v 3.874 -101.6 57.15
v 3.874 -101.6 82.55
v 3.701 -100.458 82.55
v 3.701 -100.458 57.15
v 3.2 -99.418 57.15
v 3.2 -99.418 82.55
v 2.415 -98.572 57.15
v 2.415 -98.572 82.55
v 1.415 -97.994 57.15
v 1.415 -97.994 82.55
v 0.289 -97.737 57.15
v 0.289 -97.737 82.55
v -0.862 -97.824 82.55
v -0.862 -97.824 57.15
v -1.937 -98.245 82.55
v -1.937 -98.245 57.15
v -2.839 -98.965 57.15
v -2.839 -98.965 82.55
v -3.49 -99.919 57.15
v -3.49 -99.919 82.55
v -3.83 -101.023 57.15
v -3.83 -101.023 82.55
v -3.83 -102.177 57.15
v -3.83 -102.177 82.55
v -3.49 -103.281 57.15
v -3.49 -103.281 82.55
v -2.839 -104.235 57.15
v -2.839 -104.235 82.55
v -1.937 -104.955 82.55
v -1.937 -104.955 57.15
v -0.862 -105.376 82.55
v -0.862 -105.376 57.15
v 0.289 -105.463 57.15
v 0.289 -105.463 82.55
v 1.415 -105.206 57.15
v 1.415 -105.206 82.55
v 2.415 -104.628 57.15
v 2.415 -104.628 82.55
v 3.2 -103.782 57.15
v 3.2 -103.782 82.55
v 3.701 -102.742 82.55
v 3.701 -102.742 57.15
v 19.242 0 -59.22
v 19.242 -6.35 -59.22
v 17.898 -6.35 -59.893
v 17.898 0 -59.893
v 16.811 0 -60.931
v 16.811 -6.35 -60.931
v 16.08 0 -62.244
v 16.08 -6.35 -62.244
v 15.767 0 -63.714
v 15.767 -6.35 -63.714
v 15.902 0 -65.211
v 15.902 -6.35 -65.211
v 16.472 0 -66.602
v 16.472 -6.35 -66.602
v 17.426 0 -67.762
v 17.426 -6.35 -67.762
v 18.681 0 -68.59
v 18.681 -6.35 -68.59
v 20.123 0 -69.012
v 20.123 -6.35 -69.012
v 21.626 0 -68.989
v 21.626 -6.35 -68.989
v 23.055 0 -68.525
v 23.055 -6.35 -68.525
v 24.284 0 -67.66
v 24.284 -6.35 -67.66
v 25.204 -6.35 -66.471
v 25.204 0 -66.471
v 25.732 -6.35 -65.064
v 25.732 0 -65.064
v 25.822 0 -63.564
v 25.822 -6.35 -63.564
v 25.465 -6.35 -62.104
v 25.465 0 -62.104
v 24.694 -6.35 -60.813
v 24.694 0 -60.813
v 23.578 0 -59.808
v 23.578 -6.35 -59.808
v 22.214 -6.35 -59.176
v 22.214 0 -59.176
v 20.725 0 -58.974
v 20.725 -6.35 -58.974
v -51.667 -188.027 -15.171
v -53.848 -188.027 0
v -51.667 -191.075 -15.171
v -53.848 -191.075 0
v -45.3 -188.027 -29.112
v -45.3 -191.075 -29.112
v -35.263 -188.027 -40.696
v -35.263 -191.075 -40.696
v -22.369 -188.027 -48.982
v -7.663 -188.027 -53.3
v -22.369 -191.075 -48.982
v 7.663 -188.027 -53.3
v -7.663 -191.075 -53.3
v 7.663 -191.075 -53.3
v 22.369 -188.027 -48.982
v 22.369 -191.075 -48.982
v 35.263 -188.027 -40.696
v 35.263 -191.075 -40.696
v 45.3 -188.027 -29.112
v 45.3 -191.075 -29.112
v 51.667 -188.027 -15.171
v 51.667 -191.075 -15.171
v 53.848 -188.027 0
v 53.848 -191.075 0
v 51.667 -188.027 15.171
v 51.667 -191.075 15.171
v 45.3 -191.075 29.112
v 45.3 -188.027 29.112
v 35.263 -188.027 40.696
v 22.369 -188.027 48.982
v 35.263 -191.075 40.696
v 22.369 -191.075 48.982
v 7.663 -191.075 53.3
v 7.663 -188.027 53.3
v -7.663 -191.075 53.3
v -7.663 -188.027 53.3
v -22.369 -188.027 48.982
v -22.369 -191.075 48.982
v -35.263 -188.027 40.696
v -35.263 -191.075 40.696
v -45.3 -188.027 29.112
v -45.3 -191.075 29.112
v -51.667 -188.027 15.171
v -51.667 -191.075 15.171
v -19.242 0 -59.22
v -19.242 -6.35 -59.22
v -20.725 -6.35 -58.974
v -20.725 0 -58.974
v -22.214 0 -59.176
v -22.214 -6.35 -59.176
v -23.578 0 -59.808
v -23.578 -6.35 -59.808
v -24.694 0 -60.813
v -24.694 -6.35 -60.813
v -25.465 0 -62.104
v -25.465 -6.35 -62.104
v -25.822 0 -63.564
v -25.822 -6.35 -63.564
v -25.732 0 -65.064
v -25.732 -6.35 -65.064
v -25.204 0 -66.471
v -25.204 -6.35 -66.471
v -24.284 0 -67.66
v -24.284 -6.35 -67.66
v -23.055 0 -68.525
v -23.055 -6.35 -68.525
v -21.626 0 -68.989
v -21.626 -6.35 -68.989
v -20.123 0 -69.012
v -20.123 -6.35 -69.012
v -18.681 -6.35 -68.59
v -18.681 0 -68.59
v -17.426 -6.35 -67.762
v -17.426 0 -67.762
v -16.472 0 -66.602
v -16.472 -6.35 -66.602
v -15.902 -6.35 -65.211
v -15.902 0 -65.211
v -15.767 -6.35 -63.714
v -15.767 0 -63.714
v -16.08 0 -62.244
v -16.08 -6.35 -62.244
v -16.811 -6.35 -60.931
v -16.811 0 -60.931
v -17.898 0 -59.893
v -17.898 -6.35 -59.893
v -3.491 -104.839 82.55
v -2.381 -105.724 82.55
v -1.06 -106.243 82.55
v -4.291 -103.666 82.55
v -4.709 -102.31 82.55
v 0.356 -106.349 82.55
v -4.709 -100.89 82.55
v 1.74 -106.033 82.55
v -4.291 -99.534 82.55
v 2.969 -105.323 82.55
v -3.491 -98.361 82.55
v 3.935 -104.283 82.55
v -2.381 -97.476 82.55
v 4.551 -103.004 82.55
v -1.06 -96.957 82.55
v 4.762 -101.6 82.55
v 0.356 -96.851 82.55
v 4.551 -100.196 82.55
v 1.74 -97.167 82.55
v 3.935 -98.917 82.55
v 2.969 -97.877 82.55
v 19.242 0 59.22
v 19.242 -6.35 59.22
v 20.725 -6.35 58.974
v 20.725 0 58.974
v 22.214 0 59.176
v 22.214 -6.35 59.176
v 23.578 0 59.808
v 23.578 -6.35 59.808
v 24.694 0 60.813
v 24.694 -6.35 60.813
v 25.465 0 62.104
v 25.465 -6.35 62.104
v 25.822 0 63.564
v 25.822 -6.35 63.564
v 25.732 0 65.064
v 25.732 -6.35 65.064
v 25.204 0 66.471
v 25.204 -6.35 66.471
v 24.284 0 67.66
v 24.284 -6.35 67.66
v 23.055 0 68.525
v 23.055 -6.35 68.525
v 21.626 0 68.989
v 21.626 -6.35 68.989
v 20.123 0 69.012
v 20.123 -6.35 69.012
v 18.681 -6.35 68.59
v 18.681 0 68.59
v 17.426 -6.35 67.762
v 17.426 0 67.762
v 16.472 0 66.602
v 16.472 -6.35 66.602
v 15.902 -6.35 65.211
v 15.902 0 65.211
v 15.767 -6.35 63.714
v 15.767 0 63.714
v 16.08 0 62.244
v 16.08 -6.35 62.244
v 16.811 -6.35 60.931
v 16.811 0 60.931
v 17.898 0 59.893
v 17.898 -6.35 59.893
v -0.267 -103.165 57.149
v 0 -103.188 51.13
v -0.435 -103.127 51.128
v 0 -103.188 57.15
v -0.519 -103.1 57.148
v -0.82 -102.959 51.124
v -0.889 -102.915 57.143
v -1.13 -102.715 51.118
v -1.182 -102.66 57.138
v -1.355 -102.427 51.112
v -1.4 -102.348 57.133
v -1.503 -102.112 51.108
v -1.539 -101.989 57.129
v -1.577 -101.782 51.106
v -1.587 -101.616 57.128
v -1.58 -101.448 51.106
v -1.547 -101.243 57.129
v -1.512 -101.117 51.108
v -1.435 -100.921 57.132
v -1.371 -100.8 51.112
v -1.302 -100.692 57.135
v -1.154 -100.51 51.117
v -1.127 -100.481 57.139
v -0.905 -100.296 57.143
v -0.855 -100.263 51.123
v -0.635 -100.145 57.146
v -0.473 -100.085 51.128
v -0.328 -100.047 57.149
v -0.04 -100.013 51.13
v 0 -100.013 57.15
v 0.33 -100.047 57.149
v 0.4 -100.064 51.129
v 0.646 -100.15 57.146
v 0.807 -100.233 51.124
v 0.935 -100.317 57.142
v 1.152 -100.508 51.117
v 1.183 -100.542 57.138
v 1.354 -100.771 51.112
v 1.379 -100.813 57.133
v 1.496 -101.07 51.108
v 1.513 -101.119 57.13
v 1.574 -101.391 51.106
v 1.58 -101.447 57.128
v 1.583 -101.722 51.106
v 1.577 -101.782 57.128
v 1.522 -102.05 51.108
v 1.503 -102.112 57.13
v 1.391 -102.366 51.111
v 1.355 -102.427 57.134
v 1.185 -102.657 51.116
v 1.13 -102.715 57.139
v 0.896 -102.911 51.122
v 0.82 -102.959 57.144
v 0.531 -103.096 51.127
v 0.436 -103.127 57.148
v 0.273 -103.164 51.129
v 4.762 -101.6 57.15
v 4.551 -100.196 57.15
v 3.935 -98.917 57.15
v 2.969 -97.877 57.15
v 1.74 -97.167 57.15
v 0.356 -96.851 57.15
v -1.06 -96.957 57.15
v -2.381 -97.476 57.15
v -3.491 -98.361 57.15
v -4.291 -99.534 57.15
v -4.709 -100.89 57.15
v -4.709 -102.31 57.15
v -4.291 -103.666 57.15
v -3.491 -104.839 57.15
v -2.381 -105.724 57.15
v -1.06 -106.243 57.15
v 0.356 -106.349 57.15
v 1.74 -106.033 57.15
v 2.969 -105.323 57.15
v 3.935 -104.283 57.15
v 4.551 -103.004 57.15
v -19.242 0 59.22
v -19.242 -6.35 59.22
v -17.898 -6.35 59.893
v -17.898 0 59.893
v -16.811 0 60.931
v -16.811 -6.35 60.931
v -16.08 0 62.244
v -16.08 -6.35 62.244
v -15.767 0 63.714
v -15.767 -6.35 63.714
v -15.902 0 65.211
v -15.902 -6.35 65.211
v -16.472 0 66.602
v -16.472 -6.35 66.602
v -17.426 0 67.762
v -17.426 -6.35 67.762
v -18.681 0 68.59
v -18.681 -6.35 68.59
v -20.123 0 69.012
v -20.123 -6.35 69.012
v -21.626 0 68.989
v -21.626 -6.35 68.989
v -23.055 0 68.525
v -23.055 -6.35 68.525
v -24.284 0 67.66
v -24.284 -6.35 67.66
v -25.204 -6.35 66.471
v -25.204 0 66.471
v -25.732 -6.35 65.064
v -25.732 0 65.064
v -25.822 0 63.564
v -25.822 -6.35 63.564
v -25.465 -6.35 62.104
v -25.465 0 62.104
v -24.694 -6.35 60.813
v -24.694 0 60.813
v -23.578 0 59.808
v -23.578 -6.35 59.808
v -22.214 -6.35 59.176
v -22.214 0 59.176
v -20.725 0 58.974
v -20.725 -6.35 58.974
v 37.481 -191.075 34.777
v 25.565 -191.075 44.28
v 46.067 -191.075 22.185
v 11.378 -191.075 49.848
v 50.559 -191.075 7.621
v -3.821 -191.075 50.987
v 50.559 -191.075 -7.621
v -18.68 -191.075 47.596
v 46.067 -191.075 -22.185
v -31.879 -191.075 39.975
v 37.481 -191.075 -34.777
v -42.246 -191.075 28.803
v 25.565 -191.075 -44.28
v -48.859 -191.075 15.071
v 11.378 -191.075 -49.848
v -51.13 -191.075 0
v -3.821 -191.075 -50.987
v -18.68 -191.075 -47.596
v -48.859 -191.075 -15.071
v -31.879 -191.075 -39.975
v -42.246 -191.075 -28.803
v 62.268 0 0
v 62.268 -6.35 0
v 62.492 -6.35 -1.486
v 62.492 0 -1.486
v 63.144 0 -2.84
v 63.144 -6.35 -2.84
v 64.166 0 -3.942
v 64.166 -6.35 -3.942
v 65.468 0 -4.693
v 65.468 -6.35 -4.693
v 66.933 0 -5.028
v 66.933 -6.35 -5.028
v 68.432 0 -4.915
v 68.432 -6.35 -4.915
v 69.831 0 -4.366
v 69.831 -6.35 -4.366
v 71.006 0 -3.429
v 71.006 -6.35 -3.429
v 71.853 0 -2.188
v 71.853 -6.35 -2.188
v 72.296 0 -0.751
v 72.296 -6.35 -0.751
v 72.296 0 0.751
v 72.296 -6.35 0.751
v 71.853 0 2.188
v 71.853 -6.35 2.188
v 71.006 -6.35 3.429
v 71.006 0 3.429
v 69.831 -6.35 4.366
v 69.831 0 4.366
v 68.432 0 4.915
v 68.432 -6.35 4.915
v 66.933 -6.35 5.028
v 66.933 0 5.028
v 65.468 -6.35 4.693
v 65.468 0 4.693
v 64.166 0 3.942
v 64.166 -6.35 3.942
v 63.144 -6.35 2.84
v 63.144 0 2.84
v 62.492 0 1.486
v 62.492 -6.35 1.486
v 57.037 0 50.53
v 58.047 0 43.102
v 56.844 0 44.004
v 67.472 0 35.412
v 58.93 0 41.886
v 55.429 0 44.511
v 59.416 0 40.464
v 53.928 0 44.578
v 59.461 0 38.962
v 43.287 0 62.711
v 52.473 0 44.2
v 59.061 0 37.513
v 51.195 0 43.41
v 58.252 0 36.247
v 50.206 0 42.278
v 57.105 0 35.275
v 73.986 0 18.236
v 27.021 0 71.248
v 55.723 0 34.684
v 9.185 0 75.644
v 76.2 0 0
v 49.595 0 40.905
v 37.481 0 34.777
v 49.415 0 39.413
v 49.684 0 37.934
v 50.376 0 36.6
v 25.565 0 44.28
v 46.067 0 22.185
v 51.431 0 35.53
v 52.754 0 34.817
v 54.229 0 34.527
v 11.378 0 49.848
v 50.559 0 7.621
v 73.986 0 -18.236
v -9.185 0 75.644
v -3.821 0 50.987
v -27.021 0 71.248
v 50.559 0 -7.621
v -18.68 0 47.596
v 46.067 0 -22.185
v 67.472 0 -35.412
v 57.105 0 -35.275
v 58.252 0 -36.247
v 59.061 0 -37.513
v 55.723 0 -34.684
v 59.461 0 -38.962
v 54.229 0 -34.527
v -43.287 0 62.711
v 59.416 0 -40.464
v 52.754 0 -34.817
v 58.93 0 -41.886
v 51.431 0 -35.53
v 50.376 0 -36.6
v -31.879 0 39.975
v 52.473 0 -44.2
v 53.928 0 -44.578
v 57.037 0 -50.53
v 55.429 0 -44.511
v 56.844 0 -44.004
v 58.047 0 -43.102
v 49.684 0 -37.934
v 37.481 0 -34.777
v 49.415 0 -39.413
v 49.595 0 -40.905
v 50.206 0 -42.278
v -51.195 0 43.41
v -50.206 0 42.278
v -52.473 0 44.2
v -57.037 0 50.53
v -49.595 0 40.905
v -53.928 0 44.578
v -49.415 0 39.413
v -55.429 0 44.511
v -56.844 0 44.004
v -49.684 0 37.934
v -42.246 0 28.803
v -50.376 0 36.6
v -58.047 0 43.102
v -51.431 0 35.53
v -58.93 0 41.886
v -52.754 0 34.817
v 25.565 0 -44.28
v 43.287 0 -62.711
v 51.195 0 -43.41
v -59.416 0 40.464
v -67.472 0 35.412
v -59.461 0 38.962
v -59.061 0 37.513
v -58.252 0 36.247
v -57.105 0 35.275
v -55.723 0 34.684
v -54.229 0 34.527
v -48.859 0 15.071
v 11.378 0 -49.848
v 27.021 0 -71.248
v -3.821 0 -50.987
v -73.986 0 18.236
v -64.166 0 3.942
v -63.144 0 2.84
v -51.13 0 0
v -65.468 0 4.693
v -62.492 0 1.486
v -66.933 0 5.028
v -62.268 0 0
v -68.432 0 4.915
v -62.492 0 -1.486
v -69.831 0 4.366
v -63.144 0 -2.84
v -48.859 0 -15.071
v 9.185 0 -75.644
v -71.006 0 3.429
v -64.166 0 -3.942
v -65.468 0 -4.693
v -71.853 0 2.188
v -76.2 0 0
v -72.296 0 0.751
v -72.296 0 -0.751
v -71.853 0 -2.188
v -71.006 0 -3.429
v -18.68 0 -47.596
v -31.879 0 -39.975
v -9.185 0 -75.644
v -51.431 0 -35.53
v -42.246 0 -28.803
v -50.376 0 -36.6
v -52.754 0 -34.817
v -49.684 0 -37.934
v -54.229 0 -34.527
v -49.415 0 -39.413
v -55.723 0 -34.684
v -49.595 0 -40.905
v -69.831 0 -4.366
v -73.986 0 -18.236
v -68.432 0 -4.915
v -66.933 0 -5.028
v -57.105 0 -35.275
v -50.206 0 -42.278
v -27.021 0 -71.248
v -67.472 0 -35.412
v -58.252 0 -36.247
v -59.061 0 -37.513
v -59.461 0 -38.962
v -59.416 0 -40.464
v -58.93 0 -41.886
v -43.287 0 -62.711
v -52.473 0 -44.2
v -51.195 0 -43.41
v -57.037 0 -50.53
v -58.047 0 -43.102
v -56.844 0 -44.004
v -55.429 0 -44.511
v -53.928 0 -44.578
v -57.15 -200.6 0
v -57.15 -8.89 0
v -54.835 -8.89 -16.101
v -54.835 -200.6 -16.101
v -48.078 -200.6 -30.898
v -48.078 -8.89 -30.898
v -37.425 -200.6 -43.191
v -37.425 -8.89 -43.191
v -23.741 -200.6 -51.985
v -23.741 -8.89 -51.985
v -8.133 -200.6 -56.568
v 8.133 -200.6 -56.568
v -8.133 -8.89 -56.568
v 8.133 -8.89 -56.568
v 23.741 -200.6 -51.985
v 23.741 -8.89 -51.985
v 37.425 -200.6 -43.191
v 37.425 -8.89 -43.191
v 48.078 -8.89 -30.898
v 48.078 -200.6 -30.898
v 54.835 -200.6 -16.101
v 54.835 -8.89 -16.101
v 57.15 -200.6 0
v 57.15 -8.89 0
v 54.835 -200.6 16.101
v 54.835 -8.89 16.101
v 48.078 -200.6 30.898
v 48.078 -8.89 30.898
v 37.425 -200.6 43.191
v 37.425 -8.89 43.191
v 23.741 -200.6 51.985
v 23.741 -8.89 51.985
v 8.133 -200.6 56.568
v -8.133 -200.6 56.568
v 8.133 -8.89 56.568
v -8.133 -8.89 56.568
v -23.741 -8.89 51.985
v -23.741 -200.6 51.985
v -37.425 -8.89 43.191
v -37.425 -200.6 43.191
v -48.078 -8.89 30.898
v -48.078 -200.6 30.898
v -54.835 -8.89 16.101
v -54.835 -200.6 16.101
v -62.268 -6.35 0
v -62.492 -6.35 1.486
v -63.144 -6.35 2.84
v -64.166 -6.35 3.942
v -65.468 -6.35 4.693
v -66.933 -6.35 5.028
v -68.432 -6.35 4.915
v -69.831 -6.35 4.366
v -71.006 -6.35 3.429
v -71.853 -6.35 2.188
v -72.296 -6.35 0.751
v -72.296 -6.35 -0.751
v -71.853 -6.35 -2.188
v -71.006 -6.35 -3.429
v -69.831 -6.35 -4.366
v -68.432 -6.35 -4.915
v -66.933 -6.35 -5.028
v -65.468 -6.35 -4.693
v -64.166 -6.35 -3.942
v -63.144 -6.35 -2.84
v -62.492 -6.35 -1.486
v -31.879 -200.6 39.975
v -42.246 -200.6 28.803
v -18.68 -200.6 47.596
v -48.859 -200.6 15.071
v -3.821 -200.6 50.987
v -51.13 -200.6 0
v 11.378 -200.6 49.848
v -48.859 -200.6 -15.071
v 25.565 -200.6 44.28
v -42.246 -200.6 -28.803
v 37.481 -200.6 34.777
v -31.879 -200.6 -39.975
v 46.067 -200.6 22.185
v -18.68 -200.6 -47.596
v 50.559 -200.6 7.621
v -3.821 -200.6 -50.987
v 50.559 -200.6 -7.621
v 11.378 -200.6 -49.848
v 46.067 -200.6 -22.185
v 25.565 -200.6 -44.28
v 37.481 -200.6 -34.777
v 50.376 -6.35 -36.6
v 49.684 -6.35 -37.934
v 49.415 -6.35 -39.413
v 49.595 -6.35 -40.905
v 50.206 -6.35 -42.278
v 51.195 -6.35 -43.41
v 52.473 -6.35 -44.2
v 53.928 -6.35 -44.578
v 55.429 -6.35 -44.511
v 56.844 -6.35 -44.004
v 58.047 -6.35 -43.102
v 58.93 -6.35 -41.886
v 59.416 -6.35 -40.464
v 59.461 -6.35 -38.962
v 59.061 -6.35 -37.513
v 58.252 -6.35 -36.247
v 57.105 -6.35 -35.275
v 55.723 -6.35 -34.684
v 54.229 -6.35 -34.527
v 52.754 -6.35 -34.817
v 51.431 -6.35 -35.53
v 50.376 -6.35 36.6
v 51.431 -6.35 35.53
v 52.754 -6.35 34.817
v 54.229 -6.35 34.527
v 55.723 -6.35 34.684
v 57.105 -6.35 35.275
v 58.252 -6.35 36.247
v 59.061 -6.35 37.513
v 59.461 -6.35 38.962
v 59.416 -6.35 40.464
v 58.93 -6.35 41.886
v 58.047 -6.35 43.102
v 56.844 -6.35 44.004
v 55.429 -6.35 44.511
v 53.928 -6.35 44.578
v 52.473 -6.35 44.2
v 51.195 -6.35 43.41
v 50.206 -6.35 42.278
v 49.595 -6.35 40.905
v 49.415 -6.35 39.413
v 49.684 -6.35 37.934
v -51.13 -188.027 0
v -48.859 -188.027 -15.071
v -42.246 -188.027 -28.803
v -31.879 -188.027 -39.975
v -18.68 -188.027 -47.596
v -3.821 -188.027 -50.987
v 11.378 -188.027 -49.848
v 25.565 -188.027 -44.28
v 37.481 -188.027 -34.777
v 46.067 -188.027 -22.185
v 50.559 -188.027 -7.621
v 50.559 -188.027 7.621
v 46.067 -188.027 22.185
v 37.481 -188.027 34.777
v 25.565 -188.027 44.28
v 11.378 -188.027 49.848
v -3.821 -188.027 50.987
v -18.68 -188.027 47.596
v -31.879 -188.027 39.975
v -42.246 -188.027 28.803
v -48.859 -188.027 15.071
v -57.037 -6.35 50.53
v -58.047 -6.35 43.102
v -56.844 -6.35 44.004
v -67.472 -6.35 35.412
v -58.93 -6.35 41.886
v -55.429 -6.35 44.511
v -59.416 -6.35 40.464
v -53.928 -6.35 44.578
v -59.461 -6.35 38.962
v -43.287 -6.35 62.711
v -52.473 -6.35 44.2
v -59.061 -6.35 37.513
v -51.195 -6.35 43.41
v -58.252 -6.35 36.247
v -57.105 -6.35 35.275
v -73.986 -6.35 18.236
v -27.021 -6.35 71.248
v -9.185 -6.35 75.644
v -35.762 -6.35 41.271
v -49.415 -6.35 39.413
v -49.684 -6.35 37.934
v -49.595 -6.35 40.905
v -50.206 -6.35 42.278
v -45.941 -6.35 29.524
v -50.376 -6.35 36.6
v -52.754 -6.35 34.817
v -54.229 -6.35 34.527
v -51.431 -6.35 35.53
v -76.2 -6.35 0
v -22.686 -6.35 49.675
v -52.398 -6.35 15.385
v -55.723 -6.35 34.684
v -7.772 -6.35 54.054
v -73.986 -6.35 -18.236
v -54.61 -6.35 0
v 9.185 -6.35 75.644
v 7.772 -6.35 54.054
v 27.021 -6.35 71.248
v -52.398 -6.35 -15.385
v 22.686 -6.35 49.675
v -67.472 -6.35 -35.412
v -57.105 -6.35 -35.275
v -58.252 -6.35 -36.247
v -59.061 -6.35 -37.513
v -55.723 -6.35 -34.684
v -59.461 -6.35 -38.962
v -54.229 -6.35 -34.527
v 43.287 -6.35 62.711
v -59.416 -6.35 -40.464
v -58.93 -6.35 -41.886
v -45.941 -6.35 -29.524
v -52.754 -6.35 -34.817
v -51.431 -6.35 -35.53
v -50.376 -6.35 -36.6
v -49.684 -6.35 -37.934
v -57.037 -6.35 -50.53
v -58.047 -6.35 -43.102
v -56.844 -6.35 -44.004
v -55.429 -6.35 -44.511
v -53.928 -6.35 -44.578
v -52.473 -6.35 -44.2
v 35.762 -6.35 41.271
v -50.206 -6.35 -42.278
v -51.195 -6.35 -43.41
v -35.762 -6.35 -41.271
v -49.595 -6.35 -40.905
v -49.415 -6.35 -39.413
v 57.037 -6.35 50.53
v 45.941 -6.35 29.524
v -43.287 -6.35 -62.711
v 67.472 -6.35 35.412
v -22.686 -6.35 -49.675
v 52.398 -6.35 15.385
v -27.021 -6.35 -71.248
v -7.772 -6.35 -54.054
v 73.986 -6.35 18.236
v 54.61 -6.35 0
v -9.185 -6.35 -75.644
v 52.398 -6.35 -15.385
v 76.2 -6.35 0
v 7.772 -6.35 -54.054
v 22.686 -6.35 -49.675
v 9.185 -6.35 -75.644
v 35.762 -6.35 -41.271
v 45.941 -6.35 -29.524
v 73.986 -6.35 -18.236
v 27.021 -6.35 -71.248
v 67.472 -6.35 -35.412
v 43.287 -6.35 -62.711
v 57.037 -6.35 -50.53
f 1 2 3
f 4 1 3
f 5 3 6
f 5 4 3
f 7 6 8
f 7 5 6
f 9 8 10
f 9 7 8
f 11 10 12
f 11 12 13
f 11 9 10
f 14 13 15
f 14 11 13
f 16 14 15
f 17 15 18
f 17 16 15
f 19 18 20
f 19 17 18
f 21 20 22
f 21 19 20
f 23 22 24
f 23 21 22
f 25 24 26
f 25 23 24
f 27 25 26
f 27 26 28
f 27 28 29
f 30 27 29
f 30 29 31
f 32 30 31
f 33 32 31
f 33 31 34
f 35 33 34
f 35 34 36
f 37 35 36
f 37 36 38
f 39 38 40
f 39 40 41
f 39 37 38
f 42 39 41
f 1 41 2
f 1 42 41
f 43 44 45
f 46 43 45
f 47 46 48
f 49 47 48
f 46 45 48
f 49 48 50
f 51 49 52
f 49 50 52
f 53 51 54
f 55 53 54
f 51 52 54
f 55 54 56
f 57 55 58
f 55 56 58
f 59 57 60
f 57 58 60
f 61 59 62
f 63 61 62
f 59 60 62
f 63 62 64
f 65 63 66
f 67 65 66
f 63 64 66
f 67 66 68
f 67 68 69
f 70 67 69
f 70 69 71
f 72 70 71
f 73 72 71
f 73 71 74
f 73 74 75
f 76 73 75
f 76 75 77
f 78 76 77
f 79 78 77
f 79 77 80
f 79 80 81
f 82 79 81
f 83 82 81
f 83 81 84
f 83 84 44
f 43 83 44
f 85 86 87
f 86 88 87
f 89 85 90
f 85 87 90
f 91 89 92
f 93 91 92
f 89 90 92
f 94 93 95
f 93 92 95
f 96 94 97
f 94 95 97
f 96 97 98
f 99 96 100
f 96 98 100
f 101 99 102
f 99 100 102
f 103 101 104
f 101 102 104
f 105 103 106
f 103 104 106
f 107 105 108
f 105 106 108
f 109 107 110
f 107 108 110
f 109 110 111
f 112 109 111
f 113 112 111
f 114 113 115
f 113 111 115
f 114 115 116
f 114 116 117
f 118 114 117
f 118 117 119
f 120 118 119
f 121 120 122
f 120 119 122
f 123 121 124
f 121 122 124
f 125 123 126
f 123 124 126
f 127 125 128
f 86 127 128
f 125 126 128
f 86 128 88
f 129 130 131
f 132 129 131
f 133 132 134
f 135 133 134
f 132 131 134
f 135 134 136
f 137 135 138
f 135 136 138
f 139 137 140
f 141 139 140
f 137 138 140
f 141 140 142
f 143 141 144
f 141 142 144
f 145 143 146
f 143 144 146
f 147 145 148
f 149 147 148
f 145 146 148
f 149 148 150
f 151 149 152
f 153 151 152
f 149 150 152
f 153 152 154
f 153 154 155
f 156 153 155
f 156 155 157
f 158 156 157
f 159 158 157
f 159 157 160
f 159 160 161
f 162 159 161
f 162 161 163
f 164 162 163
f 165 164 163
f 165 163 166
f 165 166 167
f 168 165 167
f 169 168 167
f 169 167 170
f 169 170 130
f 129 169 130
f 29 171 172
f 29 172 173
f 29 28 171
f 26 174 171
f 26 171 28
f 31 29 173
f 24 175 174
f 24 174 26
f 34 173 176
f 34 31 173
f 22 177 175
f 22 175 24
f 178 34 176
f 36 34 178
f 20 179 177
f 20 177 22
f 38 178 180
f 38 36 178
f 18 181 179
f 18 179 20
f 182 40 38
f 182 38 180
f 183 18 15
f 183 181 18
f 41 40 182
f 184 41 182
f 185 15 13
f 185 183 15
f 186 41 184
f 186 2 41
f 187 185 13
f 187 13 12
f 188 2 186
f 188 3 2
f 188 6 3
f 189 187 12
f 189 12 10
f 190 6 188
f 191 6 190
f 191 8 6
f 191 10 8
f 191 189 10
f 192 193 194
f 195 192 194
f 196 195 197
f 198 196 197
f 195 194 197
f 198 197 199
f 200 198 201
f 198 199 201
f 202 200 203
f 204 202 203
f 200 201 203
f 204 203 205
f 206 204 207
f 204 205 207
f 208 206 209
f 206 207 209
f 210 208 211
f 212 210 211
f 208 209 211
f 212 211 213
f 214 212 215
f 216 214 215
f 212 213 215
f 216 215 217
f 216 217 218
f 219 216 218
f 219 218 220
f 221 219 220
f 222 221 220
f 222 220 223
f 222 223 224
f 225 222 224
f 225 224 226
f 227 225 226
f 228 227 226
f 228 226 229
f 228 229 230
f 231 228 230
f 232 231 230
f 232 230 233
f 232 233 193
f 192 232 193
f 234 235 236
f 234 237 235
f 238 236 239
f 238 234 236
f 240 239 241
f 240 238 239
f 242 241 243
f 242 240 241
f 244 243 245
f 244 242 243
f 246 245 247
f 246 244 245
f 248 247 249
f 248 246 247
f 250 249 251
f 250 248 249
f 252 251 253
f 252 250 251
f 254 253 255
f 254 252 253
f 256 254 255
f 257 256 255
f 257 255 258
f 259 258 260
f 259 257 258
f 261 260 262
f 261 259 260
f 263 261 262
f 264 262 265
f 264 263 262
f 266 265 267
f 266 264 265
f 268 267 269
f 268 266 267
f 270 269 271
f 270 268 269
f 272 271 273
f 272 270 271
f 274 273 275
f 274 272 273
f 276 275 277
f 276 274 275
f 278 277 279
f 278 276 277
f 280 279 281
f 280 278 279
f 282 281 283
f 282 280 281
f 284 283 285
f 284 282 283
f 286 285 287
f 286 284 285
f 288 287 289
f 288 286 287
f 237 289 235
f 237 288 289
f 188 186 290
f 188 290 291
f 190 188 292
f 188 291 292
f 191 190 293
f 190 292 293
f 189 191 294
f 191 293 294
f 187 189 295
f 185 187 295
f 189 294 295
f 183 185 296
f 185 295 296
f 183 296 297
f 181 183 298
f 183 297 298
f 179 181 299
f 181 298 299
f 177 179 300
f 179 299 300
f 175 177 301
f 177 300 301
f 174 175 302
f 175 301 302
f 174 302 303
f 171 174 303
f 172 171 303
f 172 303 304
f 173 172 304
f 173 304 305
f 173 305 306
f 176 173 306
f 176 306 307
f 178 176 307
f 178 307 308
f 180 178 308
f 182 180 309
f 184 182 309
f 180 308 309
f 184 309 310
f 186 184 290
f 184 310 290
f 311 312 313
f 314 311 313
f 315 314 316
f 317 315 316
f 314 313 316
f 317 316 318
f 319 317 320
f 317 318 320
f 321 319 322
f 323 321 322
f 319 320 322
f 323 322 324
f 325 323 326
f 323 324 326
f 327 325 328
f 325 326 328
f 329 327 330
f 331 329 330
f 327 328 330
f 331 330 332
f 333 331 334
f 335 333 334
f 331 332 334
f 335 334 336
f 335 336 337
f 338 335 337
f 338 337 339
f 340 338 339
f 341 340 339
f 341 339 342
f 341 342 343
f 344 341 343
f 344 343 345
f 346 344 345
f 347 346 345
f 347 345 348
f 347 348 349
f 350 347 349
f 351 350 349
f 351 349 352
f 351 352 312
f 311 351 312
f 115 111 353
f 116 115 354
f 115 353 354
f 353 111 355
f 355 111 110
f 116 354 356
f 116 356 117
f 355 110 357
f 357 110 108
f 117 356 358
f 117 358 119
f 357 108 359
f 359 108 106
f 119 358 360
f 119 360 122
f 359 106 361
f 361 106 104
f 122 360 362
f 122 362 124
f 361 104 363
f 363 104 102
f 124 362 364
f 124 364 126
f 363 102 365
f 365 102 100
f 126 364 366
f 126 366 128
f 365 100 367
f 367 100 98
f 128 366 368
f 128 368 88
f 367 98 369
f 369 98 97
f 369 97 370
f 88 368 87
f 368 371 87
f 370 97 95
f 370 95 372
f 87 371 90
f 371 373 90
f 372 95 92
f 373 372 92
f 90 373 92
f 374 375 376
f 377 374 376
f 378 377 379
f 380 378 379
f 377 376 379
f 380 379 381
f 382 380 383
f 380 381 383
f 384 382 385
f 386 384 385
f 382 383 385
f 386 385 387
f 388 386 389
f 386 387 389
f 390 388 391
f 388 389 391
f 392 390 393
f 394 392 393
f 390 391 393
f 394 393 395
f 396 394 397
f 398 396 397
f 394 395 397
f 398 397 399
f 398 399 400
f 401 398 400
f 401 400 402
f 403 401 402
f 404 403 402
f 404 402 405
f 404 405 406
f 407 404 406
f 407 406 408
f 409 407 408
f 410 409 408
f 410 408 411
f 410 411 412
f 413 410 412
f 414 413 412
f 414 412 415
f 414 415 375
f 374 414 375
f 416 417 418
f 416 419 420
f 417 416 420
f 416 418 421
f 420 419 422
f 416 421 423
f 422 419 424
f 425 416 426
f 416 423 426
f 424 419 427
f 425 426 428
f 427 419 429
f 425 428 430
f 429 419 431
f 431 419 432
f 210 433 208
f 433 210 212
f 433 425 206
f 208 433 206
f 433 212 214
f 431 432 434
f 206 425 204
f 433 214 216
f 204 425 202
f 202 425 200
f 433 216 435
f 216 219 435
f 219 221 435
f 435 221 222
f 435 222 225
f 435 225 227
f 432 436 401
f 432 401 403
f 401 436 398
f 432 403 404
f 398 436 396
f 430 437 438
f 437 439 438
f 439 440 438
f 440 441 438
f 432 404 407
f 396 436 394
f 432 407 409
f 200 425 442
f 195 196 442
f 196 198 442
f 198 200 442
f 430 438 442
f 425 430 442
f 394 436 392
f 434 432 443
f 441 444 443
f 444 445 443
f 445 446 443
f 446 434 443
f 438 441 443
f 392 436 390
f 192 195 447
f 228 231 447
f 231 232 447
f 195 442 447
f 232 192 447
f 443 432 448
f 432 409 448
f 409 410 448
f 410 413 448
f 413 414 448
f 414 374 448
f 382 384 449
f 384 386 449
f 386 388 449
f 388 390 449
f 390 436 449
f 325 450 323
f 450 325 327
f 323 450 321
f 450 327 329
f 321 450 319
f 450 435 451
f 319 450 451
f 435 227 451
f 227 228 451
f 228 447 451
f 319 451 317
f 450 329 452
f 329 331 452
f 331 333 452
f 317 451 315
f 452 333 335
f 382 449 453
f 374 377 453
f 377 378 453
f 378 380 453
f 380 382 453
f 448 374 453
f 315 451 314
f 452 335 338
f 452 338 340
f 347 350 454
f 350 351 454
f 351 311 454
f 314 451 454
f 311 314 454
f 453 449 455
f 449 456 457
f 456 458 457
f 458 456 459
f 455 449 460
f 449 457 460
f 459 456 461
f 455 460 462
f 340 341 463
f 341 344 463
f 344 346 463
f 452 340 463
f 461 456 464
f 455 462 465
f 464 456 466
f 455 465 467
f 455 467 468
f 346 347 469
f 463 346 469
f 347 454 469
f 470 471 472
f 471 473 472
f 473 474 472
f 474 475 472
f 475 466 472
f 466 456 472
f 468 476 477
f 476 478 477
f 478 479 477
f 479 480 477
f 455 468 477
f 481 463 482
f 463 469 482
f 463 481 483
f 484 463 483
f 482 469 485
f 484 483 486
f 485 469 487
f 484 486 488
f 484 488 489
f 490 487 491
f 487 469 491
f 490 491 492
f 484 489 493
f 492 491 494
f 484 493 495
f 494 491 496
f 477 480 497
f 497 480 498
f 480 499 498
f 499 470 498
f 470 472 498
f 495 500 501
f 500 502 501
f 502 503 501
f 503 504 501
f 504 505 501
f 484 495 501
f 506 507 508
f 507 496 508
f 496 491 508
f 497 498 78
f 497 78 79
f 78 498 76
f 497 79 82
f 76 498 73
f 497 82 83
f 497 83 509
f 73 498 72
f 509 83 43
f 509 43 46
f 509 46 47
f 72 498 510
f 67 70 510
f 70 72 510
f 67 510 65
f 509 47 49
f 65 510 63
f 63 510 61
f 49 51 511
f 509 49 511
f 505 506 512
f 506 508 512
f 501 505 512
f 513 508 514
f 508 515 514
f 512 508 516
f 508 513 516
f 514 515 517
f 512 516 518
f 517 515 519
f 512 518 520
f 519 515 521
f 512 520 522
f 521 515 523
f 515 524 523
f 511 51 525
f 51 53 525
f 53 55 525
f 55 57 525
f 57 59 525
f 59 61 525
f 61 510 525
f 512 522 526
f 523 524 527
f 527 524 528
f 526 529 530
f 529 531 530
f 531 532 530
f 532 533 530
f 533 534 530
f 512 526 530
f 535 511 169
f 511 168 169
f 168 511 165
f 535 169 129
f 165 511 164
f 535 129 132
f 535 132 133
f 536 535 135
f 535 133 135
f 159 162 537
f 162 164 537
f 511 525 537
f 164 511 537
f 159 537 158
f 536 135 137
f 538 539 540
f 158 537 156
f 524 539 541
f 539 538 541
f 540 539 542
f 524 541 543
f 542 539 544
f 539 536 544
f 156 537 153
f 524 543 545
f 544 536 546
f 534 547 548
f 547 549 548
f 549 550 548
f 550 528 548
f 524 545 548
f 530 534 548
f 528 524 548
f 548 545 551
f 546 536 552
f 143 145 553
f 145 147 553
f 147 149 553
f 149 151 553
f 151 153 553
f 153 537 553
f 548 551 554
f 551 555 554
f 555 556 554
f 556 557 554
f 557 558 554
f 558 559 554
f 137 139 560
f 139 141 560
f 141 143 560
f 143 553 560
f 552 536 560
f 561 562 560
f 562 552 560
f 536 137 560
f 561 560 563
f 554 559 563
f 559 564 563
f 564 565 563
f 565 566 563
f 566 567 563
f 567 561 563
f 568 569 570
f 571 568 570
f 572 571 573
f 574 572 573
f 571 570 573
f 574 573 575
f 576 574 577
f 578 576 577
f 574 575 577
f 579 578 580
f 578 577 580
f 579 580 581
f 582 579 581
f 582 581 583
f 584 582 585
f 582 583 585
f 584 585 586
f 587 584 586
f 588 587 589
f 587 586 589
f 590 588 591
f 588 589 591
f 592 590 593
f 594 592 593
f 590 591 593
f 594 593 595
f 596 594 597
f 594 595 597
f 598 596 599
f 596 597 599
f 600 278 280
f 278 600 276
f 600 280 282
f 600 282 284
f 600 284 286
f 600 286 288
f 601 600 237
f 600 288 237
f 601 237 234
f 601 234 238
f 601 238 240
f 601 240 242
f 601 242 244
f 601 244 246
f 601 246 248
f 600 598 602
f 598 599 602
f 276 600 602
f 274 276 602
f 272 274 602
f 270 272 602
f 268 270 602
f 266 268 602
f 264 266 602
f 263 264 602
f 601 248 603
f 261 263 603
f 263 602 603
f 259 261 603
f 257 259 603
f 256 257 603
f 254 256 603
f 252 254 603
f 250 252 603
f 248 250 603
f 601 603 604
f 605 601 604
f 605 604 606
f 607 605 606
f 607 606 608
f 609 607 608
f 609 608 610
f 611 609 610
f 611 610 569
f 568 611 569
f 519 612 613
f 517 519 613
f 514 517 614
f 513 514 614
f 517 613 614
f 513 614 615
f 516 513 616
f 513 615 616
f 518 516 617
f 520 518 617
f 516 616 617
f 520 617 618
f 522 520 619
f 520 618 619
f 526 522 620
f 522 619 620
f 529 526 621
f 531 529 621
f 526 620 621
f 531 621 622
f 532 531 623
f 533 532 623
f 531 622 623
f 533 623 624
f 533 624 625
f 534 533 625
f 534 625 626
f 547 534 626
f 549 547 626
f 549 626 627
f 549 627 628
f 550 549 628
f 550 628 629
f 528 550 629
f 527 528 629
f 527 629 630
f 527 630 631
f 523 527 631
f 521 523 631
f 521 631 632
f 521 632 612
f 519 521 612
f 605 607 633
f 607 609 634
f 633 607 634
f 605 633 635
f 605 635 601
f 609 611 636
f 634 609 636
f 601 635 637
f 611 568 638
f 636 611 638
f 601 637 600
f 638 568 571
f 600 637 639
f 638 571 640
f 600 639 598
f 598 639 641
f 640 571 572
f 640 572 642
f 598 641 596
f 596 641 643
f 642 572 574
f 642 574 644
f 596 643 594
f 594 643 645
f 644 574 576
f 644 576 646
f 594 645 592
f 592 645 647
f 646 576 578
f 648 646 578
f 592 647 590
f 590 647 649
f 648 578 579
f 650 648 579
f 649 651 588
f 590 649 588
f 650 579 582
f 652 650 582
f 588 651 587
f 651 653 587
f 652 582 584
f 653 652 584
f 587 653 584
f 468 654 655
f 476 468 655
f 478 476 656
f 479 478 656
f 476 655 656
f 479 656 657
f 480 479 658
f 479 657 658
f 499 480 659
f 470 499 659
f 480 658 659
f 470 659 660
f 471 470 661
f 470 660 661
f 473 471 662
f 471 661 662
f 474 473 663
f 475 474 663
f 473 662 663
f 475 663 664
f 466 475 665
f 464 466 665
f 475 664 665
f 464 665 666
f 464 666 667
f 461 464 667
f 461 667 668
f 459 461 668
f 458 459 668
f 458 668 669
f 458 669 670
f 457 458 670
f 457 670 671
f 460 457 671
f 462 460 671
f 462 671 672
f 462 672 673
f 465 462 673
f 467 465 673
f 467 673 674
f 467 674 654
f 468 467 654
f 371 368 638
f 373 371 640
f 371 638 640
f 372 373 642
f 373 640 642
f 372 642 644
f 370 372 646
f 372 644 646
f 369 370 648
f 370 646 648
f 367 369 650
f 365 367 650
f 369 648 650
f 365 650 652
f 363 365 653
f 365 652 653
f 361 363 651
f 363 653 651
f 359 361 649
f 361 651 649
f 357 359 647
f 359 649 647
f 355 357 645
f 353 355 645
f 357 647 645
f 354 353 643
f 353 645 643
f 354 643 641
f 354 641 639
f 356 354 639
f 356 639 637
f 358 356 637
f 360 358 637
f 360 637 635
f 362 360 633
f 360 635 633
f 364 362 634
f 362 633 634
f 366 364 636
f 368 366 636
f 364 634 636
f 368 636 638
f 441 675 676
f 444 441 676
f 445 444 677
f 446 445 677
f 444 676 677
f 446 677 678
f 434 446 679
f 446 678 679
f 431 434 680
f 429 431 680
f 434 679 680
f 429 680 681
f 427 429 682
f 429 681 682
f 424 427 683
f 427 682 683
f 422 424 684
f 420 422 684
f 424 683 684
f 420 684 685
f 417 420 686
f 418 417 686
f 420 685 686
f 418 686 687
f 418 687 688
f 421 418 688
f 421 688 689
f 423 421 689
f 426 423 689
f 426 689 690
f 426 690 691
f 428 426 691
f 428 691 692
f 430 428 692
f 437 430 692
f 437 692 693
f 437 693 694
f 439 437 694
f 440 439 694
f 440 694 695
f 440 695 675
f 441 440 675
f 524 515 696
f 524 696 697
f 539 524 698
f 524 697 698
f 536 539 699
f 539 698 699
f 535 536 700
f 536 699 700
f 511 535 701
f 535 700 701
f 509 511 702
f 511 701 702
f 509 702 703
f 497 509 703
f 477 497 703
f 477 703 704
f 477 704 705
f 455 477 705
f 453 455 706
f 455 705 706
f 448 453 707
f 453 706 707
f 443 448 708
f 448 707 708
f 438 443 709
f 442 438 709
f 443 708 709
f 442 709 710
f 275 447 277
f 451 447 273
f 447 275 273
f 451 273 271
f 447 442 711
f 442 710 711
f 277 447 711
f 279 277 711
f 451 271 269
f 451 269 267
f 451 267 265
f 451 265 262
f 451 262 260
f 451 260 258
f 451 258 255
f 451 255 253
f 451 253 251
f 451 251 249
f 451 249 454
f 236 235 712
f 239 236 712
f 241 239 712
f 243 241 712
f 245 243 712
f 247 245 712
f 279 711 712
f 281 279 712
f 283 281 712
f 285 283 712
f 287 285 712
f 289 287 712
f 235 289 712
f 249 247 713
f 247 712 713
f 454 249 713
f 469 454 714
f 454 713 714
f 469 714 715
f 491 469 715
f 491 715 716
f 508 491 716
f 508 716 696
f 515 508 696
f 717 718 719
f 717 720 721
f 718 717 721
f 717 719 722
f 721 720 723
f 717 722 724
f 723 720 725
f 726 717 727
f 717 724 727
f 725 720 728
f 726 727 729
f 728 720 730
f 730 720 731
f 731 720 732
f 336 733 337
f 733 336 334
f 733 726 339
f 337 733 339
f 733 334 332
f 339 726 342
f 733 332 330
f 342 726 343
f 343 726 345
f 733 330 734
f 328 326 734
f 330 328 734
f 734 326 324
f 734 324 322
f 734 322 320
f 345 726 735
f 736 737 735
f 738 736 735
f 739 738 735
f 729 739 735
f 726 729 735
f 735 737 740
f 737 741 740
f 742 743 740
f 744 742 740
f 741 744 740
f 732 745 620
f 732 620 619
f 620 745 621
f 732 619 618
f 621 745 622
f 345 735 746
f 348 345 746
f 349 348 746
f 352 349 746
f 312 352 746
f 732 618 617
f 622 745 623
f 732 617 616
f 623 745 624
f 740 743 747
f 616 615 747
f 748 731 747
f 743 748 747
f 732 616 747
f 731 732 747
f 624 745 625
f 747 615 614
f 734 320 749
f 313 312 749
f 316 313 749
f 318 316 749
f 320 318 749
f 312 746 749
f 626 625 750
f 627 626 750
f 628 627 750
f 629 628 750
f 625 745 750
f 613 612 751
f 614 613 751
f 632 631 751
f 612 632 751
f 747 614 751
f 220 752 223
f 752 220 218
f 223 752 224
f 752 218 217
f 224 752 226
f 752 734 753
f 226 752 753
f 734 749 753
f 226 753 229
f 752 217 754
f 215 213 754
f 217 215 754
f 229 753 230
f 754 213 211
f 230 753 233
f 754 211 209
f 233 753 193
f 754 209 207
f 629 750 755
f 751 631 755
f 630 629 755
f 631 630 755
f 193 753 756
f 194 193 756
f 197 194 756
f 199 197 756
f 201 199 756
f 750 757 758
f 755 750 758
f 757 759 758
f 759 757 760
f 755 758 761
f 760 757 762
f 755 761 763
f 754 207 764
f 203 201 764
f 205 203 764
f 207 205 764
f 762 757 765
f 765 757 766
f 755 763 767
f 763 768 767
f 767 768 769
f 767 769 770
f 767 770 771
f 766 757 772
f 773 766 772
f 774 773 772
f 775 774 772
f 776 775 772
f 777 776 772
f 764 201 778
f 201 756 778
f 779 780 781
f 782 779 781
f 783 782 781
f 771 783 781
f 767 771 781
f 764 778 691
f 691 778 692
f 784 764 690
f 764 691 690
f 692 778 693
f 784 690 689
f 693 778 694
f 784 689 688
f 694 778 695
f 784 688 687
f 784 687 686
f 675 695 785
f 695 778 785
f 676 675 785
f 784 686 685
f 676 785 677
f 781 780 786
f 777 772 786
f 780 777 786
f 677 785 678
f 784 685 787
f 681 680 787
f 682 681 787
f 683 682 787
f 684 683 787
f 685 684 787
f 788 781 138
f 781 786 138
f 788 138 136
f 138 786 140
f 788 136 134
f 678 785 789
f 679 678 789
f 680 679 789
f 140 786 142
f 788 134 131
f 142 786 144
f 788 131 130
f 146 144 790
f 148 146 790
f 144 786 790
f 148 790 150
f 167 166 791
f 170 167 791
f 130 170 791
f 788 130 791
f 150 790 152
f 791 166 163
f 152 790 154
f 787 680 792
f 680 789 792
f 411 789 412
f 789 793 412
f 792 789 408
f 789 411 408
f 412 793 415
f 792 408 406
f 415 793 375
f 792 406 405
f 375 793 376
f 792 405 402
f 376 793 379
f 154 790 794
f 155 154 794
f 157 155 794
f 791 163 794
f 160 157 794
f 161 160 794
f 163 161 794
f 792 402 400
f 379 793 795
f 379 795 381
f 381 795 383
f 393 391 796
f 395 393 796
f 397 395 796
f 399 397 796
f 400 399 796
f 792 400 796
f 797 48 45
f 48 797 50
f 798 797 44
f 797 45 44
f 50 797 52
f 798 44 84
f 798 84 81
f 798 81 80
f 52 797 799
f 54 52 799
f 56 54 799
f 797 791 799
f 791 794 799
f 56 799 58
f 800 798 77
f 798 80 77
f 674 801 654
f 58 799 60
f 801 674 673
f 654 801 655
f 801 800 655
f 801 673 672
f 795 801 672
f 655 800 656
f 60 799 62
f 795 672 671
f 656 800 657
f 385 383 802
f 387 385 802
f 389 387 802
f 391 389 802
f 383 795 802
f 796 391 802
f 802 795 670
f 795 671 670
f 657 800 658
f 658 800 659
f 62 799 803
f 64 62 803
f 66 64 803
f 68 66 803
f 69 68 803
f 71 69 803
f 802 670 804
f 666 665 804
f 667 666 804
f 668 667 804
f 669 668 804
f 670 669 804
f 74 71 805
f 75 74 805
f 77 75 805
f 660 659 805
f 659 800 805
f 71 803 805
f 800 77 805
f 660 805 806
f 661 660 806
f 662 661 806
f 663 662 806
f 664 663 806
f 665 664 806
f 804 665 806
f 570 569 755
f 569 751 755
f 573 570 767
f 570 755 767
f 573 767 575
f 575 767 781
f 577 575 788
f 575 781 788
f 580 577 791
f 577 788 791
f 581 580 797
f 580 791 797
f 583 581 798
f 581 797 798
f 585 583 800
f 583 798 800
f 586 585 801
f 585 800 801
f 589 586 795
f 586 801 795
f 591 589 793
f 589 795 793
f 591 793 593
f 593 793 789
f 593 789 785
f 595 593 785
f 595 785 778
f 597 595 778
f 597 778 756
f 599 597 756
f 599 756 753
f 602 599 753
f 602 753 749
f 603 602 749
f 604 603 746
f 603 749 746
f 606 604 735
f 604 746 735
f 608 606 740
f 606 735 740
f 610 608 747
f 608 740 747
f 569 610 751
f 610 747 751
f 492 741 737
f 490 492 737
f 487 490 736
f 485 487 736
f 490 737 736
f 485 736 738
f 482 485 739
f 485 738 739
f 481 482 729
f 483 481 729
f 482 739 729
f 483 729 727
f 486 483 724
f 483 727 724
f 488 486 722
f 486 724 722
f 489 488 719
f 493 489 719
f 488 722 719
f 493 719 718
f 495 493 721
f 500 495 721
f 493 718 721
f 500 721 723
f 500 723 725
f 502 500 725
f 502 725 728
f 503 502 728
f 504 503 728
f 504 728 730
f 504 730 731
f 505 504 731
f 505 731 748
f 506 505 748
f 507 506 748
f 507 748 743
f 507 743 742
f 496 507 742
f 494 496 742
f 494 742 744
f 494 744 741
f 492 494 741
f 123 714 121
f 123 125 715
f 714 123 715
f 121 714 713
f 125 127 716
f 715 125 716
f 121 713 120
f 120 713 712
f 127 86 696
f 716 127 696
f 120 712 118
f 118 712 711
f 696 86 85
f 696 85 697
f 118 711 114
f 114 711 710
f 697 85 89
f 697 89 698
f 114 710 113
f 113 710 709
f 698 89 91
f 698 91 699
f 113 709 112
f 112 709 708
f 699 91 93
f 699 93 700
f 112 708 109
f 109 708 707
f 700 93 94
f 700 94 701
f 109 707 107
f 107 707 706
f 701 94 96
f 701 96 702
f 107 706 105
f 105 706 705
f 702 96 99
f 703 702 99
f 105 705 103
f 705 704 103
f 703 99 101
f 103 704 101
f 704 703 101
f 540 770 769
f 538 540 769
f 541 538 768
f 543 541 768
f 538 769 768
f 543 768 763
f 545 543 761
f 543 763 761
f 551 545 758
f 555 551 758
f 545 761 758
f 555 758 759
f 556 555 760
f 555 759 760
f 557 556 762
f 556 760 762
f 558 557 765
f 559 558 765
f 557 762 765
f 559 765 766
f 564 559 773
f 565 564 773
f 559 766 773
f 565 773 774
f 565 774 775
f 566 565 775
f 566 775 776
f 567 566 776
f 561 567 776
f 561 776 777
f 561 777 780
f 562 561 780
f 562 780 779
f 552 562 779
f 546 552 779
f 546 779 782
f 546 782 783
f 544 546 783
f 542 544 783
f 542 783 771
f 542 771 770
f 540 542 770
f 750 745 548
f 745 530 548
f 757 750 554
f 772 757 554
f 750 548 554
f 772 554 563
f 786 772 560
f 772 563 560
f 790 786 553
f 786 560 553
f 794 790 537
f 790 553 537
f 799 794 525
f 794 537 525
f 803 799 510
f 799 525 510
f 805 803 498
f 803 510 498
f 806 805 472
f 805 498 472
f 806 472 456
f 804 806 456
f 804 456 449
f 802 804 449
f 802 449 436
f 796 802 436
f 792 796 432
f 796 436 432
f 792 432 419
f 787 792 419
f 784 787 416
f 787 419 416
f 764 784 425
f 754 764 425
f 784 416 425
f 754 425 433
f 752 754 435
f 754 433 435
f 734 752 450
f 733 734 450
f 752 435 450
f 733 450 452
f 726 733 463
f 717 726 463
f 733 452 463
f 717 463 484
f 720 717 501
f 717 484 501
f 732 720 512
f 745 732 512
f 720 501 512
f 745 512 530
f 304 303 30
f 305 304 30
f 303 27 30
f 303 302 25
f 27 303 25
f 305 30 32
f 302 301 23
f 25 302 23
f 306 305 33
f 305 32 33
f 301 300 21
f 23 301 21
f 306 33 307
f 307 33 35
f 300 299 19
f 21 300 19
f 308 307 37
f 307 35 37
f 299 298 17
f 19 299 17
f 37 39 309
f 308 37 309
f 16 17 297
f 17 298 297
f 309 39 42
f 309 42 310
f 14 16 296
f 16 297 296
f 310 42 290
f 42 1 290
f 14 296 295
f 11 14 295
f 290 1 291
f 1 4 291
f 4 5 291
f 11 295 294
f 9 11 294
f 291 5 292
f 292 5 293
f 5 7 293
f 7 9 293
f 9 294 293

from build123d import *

# Parameters (mm, degrees)
TAP_DRILL_FOR_3_8_16_TAP1_D = 10.0838
CIRPATTERN1_COUNT           = 10
SKETCH4_R                   = 4.7625
SKETCH4_R_2                 = 3.8735
BOSS_EXTRUDE1_DEPTH         = 25.4


with BuildPart() as part:
    # Sketch1 → Revolve1 (revolve)
    with BuildSketch(Plane.XY, mode=Mode.PRIVATE) as revolve1_sk:
        Polygon((51.1302, 0), (51.1302, -188.026963516), (53.848, -188.026963516), (53.848, -191.074963516), (51.1302, -191.074963516), (51.1302, -200.599963516), (57.15, -200.599963516), (57.15, -8.89), (54.61, -6.35), (76.2, -6.35), (76.2, 0), align=None)
    revolve(revolve1_sk.sketch.rotate(Axis((0, 0, 0), (0, -1, 0)), 180), axis=Axis((0, 0, 0), (0, -1, 0)))

    # Tap Drill for 3/8-16 Tap1 (through all)
    with Locations(Plane(origin=(0, 0, 0), x_dir=(1, 0, 0), z_dir=(0, 1, 0))):
        with Locations((67.31, 0)):
            tap_drill_for_3_8_16_tap1 = Hole(TAP_DRILL_FOR_3_8_16_TAP1_D / 2)

    # CirPattern1: Tap Drill for 3/8-16 Tap1 ×10 about axis
    cirpattern1_axis = Axis((0, 0, 0), (0, 1, 0))
    for i in range(1, CIRPATTERN1_COUNT):
        add(tap_drill_for_3_8_16_tap1.rotate(cirpattern1_axis, i * 360 / CIRPATTERN1_COUNT), mode=Mode.SUBTRACT)

    # Sketch11 → 1/8 (0.125) Diameter Hole3 (revolve, cut)
    with BuildSketch(Plane(origin=(0, -101.6, 57.15), x_dir=(0, -1, 0), z_dir=(1, 0, 0))):
        Polygon((0, 0), (0, 26.353866233), (1.5875, 25.4), (1.5875, 0), align=None)
    revolve(axis=Axis((0, -101.6, 63.5), (0, 0, -1)), mode=Mode.SUBTRACT)


with BuildPart() as body_2:
    # Sketch4 → Boss-Extrude1 (new body)
    with BuildSketch(Plane.XY.offset(57.15)):
        with Locations((0, -101.6)):
            Circle(SKETCH4_R)
        with Locations((0, -101.6)):
            Circle(SKETCH4_R_2, mode=Mode.SUBTRACT)
    extrude(amount=BOSS_EXTRUDE1_DEPTH)


solid = Compound([part.part, body_2.part])
